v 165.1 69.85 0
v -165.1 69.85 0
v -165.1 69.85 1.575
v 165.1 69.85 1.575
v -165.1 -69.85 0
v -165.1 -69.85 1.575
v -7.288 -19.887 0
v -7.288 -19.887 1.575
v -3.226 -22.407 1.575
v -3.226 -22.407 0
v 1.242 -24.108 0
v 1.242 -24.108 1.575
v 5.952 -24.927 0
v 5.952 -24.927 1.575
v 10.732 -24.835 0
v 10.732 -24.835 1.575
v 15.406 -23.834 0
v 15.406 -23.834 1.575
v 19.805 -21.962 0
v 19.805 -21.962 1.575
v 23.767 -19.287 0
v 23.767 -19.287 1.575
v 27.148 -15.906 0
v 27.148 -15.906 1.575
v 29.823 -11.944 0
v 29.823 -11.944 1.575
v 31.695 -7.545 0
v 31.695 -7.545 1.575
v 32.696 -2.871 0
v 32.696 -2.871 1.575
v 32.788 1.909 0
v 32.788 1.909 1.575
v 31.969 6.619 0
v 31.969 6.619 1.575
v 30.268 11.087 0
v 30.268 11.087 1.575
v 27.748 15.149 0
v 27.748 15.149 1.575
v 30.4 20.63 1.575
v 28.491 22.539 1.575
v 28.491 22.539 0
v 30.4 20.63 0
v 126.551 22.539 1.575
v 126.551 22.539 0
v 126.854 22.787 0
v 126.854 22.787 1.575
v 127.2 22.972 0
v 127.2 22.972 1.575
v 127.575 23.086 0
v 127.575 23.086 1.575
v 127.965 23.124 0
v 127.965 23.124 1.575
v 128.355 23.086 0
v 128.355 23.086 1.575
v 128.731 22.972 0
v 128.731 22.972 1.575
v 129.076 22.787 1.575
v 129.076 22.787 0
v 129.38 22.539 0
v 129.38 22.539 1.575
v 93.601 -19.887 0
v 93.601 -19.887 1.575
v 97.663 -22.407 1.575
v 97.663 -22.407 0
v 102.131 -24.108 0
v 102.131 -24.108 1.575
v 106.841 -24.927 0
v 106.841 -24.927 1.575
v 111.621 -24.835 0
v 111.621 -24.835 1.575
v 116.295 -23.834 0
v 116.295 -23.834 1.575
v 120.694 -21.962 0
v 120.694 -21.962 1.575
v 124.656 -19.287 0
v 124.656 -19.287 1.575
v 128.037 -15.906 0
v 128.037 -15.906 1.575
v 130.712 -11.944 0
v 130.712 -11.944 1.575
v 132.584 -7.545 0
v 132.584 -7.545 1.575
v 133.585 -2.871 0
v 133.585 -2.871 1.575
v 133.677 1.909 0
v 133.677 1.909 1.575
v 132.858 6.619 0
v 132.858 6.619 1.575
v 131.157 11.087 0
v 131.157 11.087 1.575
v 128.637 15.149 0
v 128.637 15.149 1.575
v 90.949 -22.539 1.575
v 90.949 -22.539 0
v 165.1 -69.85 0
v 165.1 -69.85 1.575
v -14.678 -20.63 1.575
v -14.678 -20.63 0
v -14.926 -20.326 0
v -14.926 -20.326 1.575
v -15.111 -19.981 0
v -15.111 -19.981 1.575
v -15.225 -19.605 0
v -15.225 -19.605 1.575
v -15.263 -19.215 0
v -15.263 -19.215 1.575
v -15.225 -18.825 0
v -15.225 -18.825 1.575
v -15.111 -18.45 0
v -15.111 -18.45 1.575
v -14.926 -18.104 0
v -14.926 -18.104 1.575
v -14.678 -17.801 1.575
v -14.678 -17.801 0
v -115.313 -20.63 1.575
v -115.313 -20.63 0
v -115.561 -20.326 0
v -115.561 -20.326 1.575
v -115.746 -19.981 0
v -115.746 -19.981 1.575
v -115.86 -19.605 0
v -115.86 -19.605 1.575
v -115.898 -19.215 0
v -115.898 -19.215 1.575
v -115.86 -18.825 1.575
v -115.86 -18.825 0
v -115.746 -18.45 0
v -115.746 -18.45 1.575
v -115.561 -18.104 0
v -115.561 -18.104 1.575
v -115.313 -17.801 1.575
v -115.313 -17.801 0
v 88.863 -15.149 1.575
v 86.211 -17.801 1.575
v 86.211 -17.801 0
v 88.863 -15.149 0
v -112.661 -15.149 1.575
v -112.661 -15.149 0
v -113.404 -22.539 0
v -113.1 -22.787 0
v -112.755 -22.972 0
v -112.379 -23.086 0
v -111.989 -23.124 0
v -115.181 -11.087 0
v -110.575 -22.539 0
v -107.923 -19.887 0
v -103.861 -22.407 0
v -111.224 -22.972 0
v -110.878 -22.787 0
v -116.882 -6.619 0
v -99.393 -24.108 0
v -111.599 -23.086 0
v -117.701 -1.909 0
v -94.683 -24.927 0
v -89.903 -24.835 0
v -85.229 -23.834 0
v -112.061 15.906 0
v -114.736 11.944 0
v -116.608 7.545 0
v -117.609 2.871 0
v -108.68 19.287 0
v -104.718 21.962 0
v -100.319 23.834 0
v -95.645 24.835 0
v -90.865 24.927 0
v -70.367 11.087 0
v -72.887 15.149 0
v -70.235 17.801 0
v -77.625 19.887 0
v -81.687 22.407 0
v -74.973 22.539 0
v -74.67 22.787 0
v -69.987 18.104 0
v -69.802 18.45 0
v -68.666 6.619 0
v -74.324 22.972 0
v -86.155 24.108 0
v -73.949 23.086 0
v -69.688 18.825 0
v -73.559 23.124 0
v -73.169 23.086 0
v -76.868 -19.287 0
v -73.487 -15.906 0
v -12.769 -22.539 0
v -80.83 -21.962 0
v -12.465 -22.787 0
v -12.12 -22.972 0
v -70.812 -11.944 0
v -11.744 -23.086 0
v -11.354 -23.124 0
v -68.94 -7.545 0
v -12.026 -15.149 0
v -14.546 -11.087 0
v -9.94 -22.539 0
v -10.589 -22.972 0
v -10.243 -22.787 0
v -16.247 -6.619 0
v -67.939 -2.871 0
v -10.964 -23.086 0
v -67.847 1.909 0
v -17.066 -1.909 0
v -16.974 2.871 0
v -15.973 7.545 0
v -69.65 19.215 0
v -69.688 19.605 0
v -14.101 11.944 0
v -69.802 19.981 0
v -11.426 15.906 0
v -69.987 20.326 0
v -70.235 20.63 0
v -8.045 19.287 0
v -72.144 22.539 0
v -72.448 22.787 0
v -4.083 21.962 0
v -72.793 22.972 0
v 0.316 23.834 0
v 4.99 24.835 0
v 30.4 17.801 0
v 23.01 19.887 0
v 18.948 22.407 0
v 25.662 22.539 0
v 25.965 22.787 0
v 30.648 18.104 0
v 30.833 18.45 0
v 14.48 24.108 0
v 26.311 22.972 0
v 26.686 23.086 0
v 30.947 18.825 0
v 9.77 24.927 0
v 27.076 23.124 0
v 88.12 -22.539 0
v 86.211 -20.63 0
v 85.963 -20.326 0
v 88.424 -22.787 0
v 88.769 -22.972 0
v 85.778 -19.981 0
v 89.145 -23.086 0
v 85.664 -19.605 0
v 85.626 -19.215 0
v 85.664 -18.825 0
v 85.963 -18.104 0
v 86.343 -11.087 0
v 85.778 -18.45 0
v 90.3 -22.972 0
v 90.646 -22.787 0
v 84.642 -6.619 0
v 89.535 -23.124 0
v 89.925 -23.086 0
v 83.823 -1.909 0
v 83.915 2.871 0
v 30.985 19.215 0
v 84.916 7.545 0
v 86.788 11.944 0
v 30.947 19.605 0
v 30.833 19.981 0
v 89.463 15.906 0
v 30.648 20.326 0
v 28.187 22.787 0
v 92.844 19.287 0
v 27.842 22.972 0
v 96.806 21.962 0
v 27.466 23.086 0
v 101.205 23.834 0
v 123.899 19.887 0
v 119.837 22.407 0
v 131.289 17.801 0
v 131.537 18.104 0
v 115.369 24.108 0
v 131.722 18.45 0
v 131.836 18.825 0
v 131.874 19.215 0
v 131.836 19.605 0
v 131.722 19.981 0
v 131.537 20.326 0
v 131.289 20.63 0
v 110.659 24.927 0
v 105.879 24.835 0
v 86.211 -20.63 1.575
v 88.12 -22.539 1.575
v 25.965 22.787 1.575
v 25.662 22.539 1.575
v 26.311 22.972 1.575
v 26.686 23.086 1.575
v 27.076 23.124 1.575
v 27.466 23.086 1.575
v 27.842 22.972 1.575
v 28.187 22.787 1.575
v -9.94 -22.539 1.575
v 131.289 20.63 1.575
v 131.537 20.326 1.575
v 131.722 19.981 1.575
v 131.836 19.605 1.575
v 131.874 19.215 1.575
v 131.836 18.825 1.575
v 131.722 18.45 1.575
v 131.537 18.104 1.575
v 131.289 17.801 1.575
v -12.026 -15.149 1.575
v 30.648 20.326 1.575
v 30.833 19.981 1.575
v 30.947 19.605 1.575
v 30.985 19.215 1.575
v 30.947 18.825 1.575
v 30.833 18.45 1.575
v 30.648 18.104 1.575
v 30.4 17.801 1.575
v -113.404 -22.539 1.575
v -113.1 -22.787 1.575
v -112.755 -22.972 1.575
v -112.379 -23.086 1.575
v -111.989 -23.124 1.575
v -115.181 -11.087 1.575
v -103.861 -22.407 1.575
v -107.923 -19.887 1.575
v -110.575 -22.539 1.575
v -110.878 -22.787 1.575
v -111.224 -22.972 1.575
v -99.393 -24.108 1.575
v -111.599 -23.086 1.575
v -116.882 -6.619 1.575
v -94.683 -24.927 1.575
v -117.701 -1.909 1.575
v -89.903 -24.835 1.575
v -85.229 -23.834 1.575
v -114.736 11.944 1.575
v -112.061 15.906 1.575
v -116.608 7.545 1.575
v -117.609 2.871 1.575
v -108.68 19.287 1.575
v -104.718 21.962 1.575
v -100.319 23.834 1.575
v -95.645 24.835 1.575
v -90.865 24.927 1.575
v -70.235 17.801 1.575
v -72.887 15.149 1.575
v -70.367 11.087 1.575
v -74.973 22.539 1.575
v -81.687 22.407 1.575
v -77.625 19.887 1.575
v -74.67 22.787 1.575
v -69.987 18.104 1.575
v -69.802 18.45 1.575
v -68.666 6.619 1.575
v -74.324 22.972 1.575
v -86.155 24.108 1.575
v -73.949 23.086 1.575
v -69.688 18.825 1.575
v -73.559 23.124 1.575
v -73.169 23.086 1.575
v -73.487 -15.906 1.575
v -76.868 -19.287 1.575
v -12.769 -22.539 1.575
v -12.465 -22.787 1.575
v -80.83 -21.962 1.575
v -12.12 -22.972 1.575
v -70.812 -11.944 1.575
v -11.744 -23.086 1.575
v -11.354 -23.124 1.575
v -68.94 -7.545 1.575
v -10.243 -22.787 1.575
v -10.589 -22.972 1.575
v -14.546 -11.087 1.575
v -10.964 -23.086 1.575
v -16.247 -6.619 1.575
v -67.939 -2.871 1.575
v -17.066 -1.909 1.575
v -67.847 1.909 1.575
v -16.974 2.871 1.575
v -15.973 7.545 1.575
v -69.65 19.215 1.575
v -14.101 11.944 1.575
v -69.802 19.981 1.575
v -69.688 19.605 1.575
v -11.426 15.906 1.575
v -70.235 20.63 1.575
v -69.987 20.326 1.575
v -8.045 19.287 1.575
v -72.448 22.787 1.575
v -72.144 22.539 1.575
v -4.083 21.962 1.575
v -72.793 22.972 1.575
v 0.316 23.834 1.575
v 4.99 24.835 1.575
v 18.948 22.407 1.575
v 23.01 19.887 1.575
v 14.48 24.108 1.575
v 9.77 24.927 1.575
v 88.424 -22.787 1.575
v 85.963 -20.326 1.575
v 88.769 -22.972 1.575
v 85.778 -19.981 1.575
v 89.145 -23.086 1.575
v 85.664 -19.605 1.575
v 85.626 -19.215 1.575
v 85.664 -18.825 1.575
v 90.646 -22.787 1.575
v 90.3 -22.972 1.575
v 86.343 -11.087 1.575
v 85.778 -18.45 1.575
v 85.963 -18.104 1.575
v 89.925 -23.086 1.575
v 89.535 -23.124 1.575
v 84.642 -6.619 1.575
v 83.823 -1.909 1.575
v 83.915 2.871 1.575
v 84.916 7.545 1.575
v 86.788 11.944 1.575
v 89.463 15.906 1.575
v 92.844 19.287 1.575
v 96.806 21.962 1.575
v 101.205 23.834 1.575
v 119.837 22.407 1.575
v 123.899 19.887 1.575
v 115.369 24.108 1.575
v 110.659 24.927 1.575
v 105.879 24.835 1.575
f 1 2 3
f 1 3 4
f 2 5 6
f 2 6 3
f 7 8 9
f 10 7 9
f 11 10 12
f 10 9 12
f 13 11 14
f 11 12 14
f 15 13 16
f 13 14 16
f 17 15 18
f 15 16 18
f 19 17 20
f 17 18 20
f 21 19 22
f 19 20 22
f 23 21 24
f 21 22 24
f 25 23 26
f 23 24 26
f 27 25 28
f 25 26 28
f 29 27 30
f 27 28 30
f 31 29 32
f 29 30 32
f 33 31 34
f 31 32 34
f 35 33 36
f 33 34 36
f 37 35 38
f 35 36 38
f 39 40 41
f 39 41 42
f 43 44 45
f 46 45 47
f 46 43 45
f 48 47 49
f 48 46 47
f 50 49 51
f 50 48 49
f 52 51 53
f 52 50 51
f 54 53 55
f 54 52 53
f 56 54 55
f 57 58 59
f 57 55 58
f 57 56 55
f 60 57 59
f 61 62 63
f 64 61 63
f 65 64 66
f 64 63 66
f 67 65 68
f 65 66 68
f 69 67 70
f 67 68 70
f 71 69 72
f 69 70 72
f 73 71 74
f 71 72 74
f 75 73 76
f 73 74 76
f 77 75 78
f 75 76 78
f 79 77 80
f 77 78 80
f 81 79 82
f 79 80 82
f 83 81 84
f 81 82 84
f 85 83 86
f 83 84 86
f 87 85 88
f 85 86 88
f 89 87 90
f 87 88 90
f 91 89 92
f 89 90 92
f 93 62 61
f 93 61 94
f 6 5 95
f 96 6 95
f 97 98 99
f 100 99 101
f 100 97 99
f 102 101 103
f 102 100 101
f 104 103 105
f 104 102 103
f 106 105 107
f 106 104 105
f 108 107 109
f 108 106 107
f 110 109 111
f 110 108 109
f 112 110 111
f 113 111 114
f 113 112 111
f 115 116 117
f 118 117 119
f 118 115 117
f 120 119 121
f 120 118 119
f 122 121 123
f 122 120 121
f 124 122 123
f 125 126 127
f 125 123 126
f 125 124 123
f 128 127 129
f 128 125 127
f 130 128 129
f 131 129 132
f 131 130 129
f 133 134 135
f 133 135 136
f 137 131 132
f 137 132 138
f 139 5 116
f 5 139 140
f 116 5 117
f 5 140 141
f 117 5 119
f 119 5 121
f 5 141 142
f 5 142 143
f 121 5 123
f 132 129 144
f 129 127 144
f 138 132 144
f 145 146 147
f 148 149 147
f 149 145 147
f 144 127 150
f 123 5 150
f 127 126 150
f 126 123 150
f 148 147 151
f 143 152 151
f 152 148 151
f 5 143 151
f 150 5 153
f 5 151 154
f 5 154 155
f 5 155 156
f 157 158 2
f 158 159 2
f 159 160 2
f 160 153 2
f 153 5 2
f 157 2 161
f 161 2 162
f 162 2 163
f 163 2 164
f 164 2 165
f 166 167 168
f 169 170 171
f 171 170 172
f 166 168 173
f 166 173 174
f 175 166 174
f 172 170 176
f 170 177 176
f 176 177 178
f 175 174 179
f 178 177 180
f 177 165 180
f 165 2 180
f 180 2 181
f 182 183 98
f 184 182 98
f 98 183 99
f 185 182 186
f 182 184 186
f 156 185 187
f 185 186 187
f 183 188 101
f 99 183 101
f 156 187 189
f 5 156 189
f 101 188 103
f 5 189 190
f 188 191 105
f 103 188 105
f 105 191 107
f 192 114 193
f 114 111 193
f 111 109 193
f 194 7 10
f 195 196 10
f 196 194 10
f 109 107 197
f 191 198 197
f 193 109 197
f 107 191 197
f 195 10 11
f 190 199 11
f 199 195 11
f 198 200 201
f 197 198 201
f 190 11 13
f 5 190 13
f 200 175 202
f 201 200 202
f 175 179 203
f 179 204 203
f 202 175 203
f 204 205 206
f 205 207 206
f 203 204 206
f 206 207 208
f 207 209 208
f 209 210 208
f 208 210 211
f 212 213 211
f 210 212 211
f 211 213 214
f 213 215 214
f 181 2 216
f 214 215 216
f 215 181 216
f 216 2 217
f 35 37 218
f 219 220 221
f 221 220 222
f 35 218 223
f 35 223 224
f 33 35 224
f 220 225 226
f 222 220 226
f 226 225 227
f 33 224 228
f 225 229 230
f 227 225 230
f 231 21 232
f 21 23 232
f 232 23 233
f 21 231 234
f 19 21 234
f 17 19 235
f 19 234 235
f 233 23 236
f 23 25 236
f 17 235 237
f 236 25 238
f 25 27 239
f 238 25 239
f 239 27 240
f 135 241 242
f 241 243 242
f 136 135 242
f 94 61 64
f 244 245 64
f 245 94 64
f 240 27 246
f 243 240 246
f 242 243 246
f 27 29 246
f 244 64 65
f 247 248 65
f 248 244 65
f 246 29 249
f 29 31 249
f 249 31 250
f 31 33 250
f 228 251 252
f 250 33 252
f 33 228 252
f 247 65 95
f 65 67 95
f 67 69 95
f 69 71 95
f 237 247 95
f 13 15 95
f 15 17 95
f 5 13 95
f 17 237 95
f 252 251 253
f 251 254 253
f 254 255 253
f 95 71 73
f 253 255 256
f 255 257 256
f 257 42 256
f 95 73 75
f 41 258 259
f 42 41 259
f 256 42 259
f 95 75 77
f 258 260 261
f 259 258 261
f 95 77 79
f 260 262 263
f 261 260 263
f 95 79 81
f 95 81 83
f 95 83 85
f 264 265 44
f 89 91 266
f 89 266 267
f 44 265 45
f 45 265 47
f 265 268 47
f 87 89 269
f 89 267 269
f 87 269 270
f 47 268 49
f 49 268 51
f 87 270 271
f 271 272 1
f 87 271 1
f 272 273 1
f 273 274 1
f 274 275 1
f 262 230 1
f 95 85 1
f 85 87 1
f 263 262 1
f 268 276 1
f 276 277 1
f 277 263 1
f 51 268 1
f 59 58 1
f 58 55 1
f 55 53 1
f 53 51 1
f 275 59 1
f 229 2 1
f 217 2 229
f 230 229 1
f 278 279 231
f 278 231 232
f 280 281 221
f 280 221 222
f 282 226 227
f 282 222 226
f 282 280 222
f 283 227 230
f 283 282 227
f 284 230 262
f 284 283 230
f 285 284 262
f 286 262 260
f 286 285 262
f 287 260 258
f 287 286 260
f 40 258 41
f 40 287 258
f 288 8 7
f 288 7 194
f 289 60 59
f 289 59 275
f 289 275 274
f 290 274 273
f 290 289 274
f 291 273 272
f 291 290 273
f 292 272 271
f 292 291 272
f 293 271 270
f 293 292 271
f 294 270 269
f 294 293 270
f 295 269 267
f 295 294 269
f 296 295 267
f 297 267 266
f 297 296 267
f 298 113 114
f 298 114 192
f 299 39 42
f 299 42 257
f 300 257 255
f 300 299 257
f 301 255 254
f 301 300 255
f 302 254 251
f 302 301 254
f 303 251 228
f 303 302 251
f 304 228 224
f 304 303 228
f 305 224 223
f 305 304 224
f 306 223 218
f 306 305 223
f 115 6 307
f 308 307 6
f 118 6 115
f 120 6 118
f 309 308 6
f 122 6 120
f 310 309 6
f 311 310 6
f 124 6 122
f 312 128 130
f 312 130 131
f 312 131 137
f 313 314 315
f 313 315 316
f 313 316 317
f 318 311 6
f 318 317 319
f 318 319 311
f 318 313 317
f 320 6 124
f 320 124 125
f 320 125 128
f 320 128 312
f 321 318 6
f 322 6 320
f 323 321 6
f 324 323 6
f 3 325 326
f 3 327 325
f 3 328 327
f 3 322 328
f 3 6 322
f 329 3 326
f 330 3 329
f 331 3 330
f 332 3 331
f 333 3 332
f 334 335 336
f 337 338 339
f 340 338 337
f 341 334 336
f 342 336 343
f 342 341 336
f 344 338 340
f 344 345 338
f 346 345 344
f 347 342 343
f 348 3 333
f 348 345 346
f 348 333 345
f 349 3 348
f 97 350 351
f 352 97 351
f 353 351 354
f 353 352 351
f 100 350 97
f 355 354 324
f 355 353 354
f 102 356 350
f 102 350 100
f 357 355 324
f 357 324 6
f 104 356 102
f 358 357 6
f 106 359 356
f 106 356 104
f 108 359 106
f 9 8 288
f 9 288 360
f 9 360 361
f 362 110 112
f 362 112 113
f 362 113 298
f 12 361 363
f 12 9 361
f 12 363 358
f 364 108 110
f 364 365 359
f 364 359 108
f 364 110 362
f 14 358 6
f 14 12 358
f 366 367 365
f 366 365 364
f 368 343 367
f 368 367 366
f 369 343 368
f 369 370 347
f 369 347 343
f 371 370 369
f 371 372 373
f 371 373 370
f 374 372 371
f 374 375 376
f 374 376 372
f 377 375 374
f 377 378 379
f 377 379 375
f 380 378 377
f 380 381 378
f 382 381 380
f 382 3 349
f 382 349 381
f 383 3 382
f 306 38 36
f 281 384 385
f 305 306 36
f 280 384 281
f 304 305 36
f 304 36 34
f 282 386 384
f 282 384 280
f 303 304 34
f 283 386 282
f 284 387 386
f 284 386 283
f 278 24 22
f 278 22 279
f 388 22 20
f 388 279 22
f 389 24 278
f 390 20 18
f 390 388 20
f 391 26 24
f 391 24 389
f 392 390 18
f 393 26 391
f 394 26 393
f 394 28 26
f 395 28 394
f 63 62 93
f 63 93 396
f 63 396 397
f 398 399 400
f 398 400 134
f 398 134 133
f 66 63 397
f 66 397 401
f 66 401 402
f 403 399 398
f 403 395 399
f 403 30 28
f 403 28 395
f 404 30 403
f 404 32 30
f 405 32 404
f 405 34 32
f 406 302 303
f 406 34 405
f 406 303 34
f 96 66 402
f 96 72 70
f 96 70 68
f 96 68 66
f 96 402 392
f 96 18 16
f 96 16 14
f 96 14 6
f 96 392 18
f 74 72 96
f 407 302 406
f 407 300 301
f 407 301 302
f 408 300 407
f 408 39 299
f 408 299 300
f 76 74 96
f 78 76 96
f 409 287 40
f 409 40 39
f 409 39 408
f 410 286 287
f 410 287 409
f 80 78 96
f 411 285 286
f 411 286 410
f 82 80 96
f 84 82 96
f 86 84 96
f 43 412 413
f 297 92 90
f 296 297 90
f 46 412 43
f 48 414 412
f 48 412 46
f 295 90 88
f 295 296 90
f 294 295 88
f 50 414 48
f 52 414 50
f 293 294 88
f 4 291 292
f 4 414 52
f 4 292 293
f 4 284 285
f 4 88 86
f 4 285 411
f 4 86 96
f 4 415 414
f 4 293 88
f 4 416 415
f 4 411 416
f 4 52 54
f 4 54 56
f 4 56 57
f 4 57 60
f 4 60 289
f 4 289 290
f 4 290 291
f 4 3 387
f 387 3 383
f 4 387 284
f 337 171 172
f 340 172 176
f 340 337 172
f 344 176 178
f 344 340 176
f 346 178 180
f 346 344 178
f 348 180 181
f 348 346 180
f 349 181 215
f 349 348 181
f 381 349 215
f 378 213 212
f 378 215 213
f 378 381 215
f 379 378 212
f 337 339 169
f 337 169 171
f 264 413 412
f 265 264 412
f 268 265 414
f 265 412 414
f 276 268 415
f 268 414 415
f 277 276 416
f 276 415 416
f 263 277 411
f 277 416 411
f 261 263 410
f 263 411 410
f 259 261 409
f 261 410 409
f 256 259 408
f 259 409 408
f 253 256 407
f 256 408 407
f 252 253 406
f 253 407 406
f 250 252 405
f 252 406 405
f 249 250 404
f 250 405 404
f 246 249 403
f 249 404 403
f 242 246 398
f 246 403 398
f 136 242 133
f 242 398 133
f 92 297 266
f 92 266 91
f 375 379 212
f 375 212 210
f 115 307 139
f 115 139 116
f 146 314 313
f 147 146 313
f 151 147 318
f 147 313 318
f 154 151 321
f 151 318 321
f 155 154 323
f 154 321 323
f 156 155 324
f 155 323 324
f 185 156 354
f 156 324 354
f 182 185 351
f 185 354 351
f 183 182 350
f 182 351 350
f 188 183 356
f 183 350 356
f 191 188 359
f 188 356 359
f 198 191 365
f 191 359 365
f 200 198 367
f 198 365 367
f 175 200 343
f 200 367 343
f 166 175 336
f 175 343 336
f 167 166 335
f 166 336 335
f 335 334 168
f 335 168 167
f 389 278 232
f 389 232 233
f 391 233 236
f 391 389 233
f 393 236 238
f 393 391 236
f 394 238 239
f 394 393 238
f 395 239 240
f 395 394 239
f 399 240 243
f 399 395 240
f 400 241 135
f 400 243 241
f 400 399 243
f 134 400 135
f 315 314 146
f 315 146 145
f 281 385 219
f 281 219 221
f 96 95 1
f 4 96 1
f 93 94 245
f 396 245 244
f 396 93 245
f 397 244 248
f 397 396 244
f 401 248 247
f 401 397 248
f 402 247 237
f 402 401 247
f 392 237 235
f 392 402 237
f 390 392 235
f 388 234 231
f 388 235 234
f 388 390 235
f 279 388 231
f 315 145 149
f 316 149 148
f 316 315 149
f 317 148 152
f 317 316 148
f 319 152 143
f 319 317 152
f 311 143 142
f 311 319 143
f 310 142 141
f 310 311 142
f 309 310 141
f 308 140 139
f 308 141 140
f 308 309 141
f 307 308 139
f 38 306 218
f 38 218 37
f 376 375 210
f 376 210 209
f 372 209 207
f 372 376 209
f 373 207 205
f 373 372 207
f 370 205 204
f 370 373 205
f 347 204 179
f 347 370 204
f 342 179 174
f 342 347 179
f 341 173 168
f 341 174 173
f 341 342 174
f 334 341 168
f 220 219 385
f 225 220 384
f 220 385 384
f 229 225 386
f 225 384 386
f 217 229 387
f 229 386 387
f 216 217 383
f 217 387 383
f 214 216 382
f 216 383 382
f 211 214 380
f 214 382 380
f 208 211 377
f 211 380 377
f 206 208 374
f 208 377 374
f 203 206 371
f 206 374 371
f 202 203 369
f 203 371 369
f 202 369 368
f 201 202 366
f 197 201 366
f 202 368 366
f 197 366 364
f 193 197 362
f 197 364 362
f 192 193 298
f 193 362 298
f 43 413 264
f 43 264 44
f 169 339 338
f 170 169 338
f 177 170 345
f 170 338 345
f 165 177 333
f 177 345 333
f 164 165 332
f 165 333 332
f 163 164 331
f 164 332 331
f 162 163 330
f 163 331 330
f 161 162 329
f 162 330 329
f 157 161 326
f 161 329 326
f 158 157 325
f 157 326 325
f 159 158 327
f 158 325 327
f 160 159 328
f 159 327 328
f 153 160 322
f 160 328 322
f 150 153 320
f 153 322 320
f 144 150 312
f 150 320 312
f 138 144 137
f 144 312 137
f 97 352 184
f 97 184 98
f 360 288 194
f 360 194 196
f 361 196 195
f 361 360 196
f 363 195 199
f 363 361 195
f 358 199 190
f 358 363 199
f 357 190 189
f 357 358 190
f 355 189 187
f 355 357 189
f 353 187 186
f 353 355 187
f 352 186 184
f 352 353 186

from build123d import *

# Parameters (mm, degrees)
SKETCH1_W           = 330.2
SKETCH1_H           = 139.7
BOSS_EXTRUDE1_DEPTH = 1.5748
SKETCH6_R           = 25
CUT_EXTRUDE3_DEPTH  = 180.27496338
CUT_EXTRUDE4_DEPTH  = 4


with BuildPart() as part:
    # Sketch1 → Boss-Extrude1 (new body)
    with BuildSketch(Plane.XY):
        Rectangle(SKETCH1_W, SKETCH1_H)
    extrude(amount=BOSS_EXTRUDE1_DEPTH)

    # Sketch6 → Cut-Extrude3 (cut, through all)
    with BuildSketch(Plane.XY.offset(1.5748)):
        with Locations((108.75, 0)):
            Circle(SKETCH6_R)
        with Locations((7.861, 0)):
            Circle(SKETCH6_R)
        with Locations((-92.774, 0)):
            Circle(SKETCH6_R)
    extrude(amount=-CUT_EXTRUDE3_DEPTH, mode=Mode.SUBTRACT)

    # Sketch8 → Cut-Extrude4 (cut)
    with BuildSketch(Plane.XY.offset(1.5748)):
        with BuildLine():
            Line((88.120489669, -22.53869864), (86.21130136, -20.629510331))
            ThreePointArc((86.21130136, -20.629510331), (85.625514922, -19.215296769), (86.21130136, -17.801083206))
            Line((86.21130136, -17.801083206), (88.862951789, -15.149432777))
            ThreePointArc((88.862951789, -15.149432777), (91.07233047, -17.67766953), (93.600567223, -19.887048211))
            Line((93.600567223, -19.887048211), (90.948916794, -22.53869864))
            ThreePointArc((90.948916794, -22.53869864), (89.534703231, -23.124485078), (88.120489669, -22.53869864))
        make_face()
        with BuildLine():
            Line((131.28869864, 17.801083206), (128.637048211, 15.149432777))
            ThreePointArc((128.637048211, 15.149432777), (126.42766953, 17.67766953), (123.899432777, 19.887048211))
            Line((123.899432777, 19.887048211), (126.551083206, 22.53869864))
            ThreePointArc((126.551083206, 22.53869864), (127.965296769, 23.124485078), (129.379510331, 22.53869864))
            Line((129.379510331, 22.53869864), (131.28869864, 20.629510331))
            ThreePointArc((131.28869864, 20.629510331), (131.874485078, 19.215296769), (131.28869864, 17.801083206))
        make_face()
        with BuildLine():
            Line((30.39969864, 17.801083206), (27.748048211, 15.149432777))
            ThreePointArc((27.748048211, 15.149432777), (25.53866953, 17.67766953), (23.010432777, 19.887048211))
            Line((23.010432777, 19.887048211), (25.662083206, 22.53869864))
            ThreePointArc((25.662083206, 22.53869864), (27.076296769, 23.124485078), (28.490510331, 22.53869864))
            Line((28.490510331, 22.53869864), (30.39969864, 20.629510331))
            ThreePointArc((30.39969864, 20.629510331), (30.985485078, 19.215296769), (30.39969864, 17.801083206))
        make_face()
        with BuildLine():
            Line((-7.288432777, -19.887048211), (-9.940083206, -22.53869864))
            ThreePointArc((-9.940083206, -22.53869864), (-11.354296769, -23.124485078), (-12.768510331, -22.53869864))
            Line((-12.768510331, -22.53869864), (-14.67769864, -20.629510331))
            ThreePointArc((-14.67769864, -20.629510331), (-15.263485078, -19.215296769), (-14.67769864, -17.801083206))
            Line((-14.67769864, -17.801083206), (-12.026048211, -15.149432777))
            ThreePointArc((-12.026048211, -15.149432777), (-9.81666953, -17.67766953), (-7.288432777, -19.887048211))
        make_face()
        with BuildLine():
            Line((-115.31269864, -17.801083206), (-112.661048211, -15.149432777))
            ThreePointArc((-112.661048211, -15.149432777), (-110.45166953, -17.67766953), (-107.923432777, -19.887048211))
            Line((-107.923432777, -19.887048211), (-110.575083206, -22.53869864))
            ThreePointArc((-110.575083206, -22.53869864), (-111.989296769, -23.124485078), (-113.403510331, -22.53869864))
            Line((-113.403510331, -22.53869864), (-115.31269864, -20.629510331))
            ThreePointArc((-115.31269864, -20.629510331), (-115.898485078, -19.215296769), (-115.31269864, -17.801083206))
        make_face()
        with BuildLine():
            Line((-70.23530136, 17.801083206), (-72.886951789, 15.149432777))
            ThreePointArc((-72.886951789, 15.149432777), (-75.09633047, 17.67766953), (-77.624567223, 19.887048211))
            Line((-77.624567223, 19.887048211), (-74.972916794, 22.53869864))
            ThreePointArc((-74.972916794, 22.53869864), (-73.558703231, 23.124485078), (-72.144489669, 22.53869864))
            Line((-72.144489669, 22.53869864), (-70.23530136, 20.629510331))
            ThreePointArc((-70.23530136, 20.629510331), (-69.649514922, 19.215296769), (-70.23530136, 17.801083206))
        make_face()
    extrude(amount=-CUT_EXTRUDE4_DEPTH, mode=Mode.SUBTRACT)


solid = part.part
